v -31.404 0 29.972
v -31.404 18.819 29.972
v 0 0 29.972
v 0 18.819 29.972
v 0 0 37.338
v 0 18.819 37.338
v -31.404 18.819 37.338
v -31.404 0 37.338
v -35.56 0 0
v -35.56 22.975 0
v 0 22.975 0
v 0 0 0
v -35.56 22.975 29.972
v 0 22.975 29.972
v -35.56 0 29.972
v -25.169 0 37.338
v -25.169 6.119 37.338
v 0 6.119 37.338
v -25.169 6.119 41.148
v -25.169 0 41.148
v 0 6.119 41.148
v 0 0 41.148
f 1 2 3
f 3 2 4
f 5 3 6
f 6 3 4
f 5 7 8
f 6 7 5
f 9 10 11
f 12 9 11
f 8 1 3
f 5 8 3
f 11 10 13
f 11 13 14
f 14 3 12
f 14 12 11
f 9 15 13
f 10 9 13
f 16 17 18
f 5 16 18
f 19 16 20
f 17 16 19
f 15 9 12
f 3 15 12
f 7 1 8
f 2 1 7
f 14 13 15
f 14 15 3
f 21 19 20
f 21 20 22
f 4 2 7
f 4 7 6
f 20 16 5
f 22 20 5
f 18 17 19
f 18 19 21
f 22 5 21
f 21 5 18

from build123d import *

# Parameters (mm, degrees)
F0_W     = 35.560001
F0_H     = 22.975456
F1_DEPTH = 29.972
F2_W     = 31.403638
F2_H     = 18.819092
F3_DEPTH = 7.366
F4_W     = 25.169091
F4_H     = 6.119091
F5_DEPTH = 3.81


with BuildPart() as f1:
    # F0 (on Top) → F1 (new body)
    with BuildSketch(Plane.XY):
        with Locations((-17.78, 11.487728)):
            Rectangle(F0_W, F0_H)
    extrude(amount=F1_DEPTH)


with BuildPart() as f3:
    # F2 (on face) → F3 (new body)
    with BuildSketch(Plane.XY.offset(29.972)):
        with Locations((-15.701819, 9.409546)):
            Rectangle(F2_W, F2_H)
    extrude(amount=F3_DEPTH)


with BuildPart() as f5:
    # F4 (on face) → F5 (new body)
    with BuildSketch(Plane.XY.offset(37.338)):
        with Locations((-12.584545, 3.059546)):
            Rectangle(F4_W, F4_H)
    extrude(amount=F5_DEPTH)


solid = Compound([f1.part, f3.part, f5.part])
